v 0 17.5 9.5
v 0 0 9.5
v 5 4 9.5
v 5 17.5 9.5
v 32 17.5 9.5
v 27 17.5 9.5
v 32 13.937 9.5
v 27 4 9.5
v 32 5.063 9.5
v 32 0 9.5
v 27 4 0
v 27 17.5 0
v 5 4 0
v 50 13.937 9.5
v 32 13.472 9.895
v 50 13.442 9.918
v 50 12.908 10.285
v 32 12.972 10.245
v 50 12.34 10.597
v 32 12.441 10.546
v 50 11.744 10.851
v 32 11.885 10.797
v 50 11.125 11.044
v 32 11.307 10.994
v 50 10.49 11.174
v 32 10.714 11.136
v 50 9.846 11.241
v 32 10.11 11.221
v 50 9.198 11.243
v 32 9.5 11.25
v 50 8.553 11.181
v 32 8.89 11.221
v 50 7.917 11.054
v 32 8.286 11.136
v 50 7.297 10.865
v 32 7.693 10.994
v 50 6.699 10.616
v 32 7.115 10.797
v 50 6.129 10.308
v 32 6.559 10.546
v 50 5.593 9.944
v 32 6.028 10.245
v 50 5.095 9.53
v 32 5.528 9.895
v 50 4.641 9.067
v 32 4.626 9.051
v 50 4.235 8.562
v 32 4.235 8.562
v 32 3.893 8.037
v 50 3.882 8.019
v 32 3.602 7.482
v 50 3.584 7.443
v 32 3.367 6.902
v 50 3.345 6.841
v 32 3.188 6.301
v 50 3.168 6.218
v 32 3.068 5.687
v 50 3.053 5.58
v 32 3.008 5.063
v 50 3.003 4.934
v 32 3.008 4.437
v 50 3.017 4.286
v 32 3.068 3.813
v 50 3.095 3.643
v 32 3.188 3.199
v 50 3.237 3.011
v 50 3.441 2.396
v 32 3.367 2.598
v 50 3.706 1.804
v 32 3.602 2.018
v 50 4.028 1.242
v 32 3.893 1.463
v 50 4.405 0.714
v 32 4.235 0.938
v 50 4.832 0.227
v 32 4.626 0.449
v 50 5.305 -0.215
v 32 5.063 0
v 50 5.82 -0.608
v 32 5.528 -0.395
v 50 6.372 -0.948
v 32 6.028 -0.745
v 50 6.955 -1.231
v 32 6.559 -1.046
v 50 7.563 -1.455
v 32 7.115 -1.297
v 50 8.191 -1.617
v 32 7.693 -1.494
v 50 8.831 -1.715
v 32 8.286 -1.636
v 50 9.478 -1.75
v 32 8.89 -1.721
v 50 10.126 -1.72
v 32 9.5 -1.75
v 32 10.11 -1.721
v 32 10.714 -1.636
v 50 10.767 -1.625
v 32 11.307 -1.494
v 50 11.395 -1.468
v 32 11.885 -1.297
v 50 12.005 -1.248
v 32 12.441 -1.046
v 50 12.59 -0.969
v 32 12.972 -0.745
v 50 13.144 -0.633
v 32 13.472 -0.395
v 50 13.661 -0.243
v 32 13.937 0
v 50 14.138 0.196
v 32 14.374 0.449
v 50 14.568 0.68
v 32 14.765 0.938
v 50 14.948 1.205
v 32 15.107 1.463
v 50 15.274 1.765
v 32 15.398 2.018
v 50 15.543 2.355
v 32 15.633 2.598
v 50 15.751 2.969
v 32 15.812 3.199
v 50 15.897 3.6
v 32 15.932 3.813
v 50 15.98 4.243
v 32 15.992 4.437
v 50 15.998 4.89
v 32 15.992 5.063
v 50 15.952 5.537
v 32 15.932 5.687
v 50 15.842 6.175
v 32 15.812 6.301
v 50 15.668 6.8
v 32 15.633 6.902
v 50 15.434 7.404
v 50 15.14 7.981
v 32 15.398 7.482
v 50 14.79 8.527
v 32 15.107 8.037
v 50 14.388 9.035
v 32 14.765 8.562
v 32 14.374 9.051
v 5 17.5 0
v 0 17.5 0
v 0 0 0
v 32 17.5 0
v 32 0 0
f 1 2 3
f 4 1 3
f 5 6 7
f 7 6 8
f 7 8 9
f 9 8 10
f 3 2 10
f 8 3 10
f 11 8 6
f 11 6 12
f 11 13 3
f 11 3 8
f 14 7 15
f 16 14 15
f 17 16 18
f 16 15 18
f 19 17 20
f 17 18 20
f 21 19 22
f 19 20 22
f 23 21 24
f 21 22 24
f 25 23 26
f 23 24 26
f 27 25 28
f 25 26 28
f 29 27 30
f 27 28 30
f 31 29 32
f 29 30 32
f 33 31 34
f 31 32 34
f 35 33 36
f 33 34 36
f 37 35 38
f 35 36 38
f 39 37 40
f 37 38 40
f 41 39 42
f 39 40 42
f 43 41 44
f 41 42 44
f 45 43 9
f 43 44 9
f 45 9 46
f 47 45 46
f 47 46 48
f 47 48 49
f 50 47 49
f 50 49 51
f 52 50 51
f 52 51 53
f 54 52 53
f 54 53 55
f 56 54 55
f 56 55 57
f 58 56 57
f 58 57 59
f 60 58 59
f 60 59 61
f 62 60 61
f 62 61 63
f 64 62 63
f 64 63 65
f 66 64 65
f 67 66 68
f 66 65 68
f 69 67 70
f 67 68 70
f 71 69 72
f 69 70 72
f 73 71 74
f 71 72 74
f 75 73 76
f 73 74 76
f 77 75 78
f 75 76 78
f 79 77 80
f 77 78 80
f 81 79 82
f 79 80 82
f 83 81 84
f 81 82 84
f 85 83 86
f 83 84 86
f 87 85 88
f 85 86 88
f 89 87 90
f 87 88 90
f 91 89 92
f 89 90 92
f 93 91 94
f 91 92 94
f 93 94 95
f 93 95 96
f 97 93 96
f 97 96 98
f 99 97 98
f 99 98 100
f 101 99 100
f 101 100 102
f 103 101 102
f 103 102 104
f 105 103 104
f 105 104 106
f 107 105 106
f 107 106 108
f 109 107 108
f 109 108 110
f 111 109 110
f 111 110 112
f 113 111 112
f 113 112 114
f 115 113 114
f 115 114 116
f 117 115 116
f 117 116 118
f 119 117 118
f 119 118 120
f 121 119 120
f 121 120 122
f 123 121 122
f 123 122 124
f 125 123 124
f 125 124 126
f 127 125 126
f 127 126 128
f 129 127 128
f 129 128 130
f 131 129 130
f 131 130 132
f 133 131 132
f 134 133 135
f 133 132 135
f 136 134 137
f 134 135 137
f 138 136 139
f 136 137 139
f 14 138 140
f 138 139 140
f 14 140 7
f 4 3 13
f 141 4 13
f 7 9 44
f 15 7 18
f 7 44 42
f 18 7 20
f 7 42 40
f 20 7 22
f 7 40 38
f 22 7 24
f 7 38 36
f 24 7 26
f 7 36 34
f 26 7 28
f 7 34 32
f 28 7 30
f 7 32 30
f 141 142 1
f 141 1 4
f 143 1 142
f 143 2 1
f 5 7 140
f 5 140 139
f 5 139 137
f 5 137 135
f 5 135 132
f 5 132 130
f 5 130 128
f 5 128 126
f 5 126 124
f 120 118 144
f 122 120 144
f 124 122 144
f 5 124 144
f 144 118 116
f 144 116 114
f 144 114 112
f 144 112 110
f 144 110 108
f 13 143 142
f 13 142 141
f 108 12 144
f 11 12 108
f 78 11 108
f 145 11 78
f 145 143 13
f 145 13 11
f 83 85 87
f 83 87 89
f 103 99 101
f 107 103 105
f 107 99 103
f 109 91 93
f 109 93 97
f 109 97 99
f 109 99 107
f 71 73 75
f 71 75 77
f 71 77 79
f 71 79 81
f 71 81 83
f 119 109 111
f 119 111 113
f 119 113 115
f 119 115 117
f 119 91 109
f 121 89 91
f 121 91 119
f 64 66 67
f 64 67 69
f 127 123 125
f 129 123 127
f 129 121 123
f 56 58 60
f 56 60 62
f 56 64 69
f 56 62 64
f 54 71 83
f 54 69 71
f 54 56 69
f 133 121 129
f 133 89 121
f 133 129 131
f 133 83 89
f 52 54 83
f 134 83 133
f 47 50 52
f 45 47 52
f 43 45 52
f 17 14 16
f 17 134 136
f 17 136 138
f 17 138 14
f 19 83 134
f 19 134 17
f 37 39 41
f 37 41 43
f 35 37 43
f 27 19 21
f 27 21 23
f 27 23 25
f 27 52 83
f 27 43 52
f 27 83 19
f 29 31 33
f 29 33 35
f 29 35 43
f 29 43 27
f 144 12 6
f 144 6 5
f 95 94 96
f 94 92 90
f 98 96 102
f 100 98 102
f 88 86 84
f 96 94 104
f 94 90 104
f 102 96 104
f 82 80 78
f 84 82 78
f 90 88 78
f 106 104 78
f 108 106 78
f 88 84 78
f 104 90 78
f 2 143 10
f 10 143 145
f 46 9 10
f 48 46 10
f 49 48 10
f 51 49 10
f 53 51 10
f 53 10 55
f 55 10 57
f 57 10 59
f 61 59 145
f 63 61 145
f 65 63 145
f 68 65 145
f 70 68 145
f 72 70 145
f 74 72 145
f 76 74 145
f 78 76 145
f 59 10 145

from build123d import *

# Parameters (mm, degrees)
SKETCH_1_W      = 32
SKETCH_1_H      = 9.5
EXTRUDE_1_DEPTH = 4
SKETCH_2_W      = 5
SKETCH_2_H      = 9.5
EXTRUDE_2_DEPTH = 13.5
SKETCH_3_W      = 5
SKETCH_3_H      = 9.5
EXTRUDE_3_DEPTH = 13.5
SKETCH_4_R      = 6.5
EXTRUDE_4_DEPTH = 18


with BuildPart() as part:
    # 草图1 → 凸台-拉伸1 (new body)
    with BuildSketch(Plane(origin=(0, 0, 0), x_dir=(1, 0, 0), z_dir=(0, 1, 0))):
        with Locations((16, -4.75)):
            Rectangle(SKETCH_1_W, SKETCH_1_H)
    extrude(amount=EXTRUDE_1_DEPTH)

    # 草图2 → 凸台-拉伸2 (add)
    with BuildSketch(Plane(origin=(0, 4, 0), x_dir=(1, 0, 0), z_dir=(0, 1, 0))):
        with Locations((2.5, -4.75)):
            Rectangle(SKETCH_2_W, SKETCH_2_H)
    extrude(amount=EXTRUDE_2_DEPTH)

    # 草图3 → 凸台-拉伸3 (add)
    with BuildSketch(Plane(origin=(0, 4, 0), x_dir=(1, 0, 0), z_dir=(0, 1, 0))):
        with Locations((29.5, -4.75)):
            Rectangle(SKETCH_3_W, SKETCH_3_H)
    extrude(amount=EXTRUDE_3_DEPTH)

    # 草图4 → 凸台-拉伸4 (add)
    with BuildSketch(Plane(origin=(32, 0, 0), x_dir=(0, 0, -1), z_dir=(1, 0, 0))):
        with Locations(Location((-4.75, 9.5, 0), (0, 0, 136.9509202))):
            Circle(SKETCH_4_R)
    extrude(amount=EXTRUDE_4_DEPTH)


solid = part.part
